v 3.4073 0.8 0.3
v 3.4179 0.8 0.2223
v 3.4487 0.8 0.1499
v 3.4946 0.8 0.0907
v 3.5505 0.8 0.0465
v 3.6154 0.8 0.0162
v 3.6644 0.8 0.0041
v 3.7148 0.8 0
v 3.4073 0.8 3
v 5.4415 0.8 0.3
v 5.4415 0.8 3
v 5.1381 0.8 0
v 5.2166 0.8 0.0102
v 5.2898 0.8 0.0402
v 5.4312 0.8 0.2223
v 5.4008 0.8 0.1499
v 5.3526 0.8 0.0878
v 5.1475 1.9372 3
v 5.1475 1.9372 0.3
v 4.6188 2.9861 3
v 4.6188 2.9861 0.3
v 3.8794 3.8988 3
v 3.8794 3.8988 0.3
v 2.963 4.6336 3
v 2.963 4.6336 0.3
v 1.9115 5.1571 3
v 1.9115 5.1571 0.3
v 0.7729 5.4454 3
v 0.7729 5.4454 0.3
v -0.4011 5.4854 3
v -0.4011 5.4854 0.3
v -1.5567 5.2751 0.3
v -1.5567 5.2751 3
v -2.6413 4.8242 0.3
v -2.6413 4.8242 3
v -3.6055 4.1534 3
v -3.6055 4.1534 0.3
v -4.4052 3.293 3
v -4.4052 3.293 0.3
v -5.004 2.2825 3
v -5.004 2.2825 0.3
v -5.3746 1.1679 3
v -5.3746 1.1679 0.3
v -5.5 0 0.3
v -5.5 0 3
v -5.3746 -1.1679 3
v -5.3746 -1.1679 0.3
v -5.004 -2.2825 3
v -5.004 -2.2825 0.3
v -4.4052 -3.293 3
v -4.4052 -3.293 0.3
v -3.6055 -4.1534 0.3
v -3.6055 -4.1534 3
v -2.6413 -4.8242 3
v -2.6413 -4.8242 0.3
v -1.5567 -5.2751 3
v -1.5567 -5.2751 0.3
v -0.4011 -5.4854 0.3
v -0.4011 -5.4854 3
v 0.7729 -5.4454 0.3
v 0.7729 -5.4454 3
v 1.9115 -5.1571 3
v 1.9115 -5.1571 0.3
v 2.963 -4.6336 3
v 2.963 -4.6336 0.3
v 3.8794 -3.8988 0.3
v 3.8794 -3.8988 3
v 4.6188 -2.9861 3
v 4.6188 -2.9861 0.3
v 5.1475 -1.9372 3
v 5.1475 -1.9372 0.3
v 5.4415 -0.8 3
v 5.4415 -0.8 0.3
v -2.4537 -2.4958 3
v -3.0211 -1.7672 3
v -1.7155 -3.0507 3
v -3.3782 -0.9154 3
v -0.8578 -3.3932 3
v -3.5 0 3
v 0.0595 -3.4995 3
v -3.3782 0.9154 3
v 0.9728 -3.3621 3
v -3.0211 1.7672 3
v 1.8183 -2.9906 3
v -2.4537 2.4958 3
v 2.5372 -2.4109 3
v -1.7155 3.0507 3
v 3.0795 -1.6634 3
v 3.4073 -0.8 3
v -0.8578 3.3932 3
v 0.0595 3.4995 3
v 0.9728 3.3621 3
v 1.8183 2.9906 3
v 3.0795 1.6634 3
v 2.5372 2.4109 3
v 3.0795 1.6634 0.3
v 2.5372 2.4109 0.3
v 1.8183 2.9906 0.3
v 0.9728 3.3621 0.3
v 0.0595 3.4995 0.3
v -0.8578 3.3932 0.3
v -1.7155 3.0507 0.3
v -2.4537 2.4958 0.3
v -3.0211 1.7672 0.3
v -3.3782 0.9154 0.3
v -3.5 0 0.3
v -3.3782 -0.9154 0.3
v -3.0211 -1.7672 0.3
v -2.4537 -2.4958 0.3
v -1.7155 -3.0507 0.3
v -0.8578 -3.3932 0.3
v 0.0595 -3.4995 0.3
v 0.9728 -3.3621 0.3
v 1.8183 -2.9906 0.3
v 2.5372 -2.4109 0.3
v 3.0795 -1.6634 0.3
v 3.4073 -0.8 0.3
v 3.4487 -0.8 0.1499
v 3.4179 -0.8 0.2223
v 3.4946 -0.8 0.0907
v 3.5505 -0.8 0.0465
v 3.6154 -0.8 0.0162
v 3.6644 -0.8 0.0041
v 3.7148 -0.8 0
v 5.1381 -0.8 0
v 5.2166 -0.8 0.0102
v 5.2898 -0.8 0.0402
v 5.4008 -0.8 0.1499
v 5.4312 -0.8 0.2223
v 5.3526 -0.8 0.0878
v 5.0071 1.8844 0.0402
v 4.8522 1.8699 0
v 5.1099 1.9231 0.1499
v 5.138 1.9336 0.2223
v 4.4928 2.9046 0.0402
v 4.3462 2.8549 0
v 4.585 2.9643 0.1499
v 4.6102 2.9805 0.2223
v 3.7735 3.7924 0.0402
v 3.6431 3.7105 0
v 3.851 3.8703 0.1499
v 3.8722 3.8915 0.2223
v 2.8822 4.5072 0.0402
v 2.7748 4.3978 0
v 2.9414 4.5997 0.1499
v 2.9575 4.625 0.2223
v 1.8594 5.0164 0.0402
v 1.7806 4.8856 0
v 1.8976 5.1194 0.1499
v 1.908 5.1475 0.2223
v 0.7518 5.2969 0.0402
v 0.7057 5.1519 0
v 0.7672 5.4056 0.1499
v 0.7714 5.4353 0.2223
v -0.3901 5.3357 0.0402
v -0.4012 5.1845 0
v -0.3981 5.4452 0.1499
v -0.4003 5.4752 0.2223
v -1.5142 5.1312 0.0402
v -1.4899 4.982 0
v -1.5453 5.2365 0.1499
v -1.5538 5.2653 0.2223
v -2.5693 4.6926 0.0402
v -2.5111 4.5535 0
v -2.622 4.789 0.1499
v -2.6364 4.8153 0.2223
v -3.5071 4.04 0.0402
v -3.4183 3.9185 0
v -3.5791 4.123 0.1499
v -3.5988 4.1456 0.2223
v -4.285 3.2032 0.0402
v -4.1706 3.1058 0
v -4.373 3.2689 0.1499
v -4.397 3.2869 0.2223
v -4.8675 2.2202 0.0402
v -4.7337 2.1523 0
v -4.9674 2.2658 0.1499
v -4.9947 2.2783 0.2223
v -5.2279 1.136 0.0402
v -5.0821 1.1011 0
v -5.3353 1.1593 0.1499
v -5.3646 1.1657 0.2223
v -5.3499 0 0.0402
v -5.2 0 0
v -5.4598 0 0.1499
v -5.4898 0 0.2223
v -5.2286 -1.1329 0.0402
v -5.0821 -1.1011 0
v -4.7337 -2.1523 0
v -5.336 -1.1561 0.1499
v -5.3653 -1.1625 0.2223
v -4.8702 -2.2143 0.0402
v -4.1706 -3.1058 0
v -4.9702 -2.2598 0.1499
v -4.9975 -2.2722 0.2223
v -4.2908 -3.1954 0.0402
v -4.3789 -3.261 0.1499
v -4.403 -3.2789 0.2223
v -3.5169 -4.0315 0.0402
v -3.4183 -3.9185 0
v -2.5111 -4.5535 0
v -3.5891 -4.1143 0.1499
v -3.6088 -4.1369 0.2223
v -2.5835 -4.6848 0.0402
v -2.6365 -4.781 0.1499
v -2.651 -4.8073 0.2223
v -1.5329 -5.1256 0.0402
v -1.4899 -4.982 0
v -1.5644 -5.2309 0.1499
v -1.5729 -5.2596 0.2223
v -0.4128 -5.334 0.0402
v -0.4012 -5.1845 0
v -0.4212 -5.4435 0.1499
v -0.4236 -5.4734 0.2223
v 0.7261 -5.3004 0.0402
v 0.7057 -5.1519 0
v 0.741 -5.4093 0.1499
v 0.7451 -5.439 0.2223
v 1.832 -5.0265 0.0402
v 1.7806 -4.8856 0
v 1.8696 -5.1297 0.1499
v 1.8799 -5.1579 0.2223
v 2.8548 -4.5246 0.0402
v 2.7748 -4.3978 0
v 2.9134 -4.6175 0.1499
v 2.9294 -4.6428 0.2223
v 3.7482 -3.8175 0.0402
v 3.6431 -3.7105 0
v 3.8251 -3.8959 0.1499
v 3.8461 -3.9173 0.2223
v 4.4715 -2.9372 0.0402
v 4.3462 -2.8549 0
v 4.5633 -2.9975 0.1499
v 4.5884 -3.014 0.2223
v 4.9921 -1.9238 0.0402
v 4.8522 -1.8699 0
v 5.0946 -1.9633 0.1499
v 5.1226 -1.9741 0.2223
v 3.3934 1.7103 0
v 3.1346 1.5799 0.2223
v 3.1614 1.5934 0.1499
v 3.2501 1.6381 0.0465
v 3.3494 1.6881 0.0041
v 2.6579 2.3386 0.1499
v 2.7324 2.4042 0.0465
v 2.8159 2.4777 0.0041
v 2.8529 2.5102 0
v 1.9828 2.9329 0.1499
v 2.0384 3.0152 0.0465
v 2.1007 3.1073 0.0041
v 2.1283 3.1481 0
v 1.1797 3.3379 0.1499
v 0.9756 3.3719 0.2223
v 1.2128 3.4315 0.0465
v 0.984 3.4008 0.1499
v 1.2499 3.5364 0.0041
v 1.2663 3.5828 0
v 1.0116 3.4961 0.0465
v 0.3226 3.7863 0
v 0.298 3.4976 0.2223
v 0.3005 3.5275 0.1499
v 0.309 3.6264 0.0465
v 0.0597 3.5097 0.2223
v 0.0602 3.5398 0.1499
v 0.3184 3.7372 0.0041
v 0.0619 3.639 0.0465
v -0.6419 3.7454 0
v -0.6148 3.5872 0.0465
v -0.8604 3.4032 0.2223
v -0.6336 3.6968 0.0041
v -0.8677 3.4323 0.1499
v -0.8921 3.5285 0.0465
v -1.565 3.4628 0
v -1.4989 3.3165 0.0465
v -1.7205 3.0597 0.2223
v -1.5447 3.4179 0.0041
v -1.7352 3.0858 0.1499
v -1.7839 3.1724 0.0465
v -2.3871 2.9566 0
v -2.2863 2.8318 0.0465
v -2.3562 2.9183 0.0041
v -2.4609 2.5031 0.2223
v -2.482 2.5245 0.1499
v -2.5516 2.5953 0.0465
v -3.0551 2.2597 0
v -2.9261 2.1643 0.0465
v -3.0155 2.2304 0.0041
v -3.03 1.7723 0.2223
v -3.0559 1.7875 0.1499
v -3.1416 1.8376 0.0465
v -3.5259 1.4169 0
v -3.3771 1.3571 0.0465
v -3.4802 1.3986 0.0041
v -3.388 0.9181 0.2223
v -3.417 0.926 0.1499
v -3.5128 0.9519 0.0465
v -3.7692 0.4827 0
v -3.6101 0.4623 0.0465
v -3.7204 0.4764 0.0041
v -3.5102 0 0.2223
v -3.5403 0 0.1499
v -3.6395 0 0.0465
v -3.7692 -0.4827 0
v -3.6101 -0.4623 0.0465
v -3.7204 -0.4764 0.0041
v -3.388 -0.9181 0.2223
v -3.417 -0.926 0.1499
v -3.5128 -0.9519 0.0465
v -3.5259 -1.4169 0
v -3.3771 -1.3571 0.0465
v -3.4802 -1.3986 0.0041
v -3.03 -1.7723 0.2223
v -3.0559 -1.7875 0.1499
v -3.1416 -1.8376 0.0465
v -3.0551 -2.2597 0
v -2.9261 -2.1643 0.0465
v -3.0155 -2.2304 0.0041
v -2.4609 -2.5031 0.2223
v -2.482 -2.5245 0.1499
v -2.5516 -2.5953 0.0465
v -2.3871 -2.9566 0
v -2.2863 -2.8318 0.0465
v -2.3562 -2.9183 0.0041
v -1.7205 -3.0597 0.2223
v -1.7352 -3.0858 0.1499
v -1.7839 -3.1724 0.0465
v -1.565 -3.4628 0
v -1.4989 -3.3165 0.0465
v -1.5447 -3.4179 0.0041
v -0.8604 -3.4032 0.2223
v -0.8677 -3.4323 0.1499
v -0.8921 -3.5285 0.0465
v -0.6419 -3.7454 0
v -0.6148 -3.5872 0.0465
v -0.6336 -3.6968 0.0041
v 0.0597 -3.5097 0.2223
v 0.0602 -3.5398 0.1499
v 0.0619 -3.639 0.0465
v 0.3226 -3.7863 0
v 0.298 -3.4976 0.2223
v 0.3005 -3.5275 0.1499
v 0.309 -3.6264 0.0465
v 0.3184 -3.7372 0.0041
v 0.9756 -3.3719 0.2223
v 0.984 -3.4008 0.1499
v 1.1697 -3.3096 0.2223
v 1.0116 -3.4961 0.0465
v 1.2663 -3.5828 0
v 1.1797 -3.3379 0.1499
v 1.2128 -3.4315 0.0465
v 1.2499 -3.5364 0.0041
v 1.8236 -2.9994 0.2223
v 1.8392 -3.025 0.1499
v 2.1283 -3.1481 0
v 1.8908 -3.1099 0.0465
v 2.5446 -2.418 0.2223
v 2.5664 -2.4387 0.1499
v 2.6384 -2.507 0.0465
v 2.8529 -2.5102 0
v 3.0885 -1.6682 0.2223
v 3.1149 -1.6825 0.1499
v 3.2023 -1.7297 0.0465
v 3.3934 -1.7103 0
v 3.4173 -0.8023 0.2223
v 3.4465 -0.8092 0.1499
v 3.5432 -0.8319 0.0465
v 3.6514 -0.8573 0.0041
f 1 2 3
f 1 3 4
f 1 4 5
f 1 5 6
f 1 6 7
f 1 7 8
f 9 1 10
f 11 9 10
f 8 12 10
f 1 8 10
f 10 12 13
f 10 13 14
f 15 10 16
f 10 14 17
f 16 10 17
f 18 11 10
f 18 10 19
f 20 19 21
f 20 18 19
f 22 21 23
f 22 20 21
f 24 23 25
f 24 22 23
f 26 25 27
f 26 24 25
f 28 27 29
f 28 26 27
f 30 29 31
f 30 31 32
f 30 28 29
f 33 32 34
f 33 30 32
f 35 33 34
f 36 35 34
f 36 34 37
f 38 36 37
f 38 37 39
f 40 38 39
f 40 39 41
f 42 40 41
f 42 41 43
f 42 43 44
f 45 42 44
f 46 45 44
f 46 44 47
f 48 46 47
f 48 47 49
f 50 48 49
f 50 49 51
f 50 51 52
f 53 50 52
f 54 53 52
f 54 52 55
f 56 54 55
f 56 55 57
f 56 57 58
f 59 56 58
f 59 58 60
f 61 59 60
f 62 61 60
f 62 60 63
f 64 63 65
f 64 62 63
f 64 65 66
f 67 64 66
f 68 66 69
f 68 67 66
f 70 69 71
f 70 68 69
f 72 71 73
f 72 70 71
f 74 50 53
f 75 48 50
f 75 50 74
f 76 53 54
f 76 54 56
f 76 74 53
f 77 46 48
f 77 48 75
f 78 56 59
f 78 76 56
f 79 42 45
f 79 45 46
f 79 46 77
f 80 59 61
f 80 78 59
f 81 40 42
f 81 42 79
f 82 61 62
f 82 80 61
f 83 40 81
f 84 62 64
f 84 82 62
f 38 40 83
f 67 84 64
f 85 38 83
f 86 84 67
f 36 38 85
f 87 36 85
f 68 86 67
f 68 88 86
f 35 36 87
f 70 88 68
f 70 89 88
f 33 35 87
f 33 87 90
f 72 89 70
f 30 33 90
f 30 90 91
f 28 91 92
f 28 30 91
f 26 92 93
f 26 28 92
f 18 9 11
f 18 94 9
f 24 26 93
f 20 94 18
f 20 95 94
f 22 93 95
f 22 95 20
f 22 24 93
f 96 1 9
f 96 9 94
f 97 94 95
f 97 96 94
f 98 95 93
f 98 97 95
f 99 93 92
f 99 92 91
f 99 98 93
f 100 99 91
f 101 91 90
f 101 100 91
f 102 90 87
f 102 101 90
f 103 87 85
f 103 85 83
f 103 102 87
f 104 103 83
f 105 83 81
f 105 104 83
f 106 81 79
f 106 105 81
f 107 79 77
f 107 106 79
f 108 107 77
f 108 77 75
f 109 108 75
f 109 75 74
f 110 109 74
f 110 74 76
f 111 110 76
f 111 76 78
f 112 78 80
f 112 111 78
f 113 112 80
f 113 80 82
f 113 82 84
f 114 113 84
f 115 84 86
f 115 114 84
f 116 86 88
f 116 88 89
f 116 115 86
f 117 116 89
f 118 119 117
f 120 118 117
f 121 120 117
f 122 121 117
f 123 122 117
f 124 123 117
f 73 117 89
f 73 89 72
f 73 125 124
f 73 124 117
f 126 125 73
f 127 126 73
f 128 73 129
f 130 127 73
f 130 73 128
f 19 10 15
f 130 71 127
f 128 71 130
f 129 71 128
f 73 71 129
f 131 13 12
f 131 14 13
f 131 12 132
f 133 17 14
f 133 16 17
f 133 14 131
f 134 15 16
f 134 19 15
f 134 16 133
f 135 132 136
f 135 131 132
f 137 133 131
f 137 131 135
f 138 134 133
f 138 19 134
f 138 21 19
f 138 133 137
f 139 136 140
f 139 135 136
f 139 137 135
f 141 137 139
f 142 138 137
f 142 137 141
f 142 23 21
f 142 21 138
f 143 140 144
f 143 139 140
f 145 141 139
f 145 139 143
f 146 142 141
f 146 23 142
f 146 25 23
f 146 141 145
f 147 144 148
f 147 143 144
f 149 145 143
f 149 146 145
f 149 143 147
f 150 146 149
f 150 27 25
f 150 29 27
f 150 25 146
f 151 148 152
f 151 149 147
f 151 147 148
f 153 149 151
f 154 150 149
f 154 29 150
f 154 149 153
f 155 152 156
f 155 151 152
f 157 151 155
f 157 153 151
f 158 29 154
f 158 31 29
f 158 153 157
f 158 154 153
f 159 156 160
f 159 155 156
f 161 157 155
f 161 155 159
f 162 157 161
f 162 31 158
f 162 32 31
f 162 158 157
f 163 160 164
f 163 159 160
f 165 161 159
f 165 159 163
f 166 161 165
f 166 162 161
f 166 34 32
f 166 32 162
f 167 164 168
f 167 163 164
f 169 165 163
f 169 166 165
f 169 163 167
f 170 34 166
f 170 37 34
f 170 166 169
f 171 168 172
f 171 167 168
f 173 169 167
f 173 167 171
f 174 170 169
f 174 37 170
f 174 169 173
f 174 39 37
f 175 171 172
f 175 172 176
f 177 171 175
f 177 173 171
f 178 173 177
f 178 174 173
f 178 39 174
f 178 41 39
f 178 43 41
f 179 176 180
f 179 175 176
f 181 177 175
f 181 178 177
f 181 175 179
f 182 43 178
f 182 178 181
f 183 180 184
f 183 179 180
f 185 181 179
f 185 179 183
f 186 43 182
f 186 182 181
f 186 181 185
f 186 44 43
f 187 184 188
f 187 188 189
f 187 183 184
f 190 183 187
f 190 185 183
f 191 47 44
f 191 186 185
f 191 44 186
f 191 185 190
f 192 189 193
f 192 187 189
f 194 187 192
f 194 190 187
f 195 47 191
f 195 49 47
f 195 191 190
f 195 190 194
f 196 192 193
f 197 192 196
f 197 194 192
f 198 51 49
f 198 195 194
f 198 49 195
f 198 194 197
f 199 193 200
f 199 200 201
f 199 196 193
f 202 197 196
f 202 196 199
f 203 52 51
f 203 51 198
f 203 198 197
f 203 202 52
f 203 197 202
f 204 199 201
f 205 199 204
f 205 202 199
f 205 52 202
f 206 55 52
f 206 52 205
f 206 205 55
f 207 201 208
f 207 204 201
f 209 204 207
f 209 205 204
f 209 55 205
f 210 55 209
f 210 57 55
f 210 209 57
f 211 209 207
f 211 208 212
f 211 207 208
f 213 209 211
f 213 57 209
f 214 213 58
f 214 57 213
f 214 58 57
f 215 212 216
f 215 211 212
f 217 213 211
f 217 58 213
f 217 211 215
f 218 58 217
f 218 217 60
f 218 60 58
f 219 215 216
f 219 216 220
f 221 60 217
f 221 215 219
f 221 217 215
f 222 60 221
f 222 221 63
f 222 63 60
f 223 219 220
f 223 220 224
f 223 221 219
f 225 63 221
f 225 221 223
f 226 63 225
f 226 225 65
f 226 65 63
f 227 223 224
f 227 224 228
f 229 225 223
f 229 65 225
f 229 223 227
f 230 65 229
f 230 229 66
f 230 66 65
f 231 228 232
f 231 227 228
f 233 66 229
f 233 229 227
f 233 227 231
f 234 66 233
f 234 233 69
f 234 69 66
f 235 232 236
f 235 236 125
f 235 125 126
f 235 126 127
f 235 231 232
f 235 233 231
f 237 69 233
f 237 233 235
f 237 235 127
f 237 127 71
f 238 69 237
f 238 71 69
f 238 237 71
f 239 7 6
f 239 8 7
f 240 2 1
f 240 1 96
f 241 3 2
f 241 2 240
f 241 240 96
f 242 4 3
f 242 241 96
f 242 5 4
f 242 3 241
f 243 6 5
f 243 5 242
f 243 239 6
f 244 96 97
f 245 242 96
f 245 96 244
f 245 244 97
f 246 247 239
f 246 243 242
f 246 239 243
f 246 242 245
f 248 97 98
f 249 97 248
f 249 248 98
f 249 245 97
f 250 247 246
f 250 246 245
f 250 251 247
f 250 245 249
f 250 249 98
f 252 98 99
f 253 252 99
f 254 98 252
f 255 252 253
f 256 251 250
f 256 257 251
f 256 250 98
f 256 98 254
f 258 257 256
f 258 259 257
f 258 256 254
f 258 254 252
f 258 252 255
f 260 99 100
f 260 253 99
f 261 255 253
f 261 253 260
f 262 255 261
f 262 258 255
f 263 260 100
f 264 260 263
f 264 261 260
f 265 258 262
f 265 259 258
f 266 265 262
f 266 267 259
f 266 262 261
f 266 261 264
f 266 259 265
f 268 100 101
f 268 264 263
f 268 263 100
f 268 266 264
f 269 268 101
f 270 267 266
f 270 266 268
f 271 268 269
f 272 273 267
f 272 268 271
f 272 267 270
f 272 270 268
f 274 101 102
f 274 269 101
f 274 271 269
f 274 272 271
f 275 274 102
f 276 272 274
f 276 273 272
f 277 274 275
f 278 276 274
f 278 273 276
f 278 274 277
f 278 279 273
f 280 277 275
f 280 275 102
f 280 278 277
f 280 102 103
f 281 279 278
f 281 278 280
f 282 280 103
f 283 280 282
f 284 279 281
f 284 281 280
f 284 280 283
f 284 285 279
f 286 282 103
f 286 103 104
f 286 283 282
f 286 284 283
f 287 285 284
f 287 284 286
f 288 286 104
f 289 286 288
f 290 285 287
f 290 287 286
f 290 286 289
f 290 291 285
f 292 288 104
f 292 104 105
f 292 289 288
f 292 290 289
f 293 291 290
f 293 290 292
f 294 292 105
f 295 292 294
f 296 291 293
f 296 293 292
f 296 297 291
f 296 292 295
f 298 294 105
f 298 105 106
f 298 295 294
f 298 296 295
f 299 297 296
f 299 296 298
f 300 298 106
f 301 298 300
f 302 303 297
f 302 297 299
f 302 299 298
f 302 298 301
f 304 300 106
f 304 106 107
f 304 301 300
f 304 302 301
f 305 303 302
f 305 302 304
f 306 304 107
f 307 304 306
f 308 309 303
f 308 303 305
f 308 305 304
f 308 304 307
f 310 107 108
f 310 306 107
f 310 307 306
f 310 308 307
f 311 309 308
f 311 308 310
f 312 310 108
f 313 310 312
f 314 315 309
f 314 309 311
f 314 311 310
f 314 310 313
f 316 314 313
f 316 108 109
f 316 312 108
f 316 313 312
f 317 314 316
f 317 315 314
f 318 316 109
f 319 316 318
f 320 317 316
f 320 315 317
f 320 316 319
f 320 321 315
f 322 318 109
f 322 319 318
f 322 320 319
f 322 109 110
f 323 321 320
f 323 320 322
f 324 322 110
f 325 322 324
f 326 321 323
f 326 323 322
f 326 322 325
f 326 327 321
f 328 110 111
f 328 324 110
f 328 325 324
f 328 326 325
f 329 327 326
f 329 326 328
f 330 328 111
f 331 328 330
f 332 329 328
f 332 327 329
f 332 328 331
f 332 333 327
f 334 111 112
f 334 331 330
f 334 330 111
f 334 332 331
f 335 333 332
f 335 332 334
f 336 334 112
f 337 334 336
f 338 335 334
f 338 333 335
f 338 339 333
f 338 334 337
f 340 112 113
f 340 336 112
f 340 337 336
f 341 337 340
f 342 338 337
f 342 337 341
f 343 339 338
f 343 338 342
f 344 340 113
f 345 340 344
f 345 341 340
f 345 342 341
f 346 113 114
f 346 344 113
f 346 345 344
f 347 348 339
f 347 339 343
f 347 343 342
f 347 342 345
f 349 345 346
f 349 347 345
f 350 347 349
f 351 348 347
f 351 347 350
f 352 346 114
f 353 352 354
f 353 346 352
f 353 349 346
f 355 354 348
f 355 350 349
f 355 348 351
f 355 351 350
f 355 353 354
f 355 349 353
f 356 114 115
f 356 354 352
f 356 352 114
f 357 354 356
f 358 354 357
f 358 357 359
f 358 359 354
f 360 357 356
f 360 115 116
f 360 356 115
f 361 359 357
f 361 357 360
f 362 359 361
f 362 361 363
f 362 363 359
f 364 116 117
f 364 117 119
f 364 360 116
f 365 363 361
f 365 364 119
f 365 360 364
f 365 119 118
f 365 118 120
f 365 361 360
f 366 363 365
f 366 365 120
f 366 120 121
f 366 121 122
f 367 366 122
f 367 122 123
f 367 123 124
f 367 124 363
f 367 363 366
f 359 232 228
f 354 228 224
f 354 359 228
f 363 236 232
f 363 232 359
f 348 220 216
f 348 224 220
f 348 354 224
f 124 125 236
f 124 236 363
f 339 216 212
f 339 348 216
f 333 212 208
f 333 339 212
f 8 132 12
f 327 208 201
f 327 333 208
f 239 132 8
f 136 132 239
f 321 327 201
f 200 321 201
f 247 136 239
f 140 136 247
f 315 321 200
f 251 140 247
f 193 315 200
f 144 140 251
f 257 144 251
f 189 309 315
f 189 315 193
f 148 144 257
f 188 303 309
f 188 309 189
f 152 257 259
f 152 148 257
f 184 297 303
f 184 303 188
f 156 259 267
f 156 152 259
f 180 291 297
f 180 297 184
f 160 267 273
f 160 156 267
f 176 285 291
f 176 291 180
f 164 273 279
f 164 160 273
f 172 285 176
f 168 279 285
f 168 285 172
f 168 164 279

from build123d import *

# Parameters (mm, degrees)
F2_W     = 4.224532
F2_H     = 1.6
F3_DEPTH = 4


with BuildPart() as f1:
    # F0 (on Front) → F1 (revolve)
    with BuildSketch(Plane.XZ):
        with BuildLine():
            ThreePointArc((3.5, 0.3), (3.587868, 0.087868), (3.8, 0))
            Line((3.8, 0), (5.2, 0))
            ThreePointArc((5.2, 0), (5.412132, 0.087868), (5.5, 0.3))
            Line((5.5, 0.3), (5.5, 3))
            Line((5.5, 3), (3.5, 3))
            Line((3.5, 3), (3.5, 0.3))
        make_face()
    revolve(axis=Axis((0, 0, 3.851013), (0, 0, 1)))

    # F2 (on Top) → F3 (cut)
    with BuildSketch(Plane.XY):
        with Locations((4.5, 0)):
            Rectangle(F2_W, F2_H)
    extrude(amount=F3_DEPTH, mode=Mode.SUBTRACT)


solid = f1.part
